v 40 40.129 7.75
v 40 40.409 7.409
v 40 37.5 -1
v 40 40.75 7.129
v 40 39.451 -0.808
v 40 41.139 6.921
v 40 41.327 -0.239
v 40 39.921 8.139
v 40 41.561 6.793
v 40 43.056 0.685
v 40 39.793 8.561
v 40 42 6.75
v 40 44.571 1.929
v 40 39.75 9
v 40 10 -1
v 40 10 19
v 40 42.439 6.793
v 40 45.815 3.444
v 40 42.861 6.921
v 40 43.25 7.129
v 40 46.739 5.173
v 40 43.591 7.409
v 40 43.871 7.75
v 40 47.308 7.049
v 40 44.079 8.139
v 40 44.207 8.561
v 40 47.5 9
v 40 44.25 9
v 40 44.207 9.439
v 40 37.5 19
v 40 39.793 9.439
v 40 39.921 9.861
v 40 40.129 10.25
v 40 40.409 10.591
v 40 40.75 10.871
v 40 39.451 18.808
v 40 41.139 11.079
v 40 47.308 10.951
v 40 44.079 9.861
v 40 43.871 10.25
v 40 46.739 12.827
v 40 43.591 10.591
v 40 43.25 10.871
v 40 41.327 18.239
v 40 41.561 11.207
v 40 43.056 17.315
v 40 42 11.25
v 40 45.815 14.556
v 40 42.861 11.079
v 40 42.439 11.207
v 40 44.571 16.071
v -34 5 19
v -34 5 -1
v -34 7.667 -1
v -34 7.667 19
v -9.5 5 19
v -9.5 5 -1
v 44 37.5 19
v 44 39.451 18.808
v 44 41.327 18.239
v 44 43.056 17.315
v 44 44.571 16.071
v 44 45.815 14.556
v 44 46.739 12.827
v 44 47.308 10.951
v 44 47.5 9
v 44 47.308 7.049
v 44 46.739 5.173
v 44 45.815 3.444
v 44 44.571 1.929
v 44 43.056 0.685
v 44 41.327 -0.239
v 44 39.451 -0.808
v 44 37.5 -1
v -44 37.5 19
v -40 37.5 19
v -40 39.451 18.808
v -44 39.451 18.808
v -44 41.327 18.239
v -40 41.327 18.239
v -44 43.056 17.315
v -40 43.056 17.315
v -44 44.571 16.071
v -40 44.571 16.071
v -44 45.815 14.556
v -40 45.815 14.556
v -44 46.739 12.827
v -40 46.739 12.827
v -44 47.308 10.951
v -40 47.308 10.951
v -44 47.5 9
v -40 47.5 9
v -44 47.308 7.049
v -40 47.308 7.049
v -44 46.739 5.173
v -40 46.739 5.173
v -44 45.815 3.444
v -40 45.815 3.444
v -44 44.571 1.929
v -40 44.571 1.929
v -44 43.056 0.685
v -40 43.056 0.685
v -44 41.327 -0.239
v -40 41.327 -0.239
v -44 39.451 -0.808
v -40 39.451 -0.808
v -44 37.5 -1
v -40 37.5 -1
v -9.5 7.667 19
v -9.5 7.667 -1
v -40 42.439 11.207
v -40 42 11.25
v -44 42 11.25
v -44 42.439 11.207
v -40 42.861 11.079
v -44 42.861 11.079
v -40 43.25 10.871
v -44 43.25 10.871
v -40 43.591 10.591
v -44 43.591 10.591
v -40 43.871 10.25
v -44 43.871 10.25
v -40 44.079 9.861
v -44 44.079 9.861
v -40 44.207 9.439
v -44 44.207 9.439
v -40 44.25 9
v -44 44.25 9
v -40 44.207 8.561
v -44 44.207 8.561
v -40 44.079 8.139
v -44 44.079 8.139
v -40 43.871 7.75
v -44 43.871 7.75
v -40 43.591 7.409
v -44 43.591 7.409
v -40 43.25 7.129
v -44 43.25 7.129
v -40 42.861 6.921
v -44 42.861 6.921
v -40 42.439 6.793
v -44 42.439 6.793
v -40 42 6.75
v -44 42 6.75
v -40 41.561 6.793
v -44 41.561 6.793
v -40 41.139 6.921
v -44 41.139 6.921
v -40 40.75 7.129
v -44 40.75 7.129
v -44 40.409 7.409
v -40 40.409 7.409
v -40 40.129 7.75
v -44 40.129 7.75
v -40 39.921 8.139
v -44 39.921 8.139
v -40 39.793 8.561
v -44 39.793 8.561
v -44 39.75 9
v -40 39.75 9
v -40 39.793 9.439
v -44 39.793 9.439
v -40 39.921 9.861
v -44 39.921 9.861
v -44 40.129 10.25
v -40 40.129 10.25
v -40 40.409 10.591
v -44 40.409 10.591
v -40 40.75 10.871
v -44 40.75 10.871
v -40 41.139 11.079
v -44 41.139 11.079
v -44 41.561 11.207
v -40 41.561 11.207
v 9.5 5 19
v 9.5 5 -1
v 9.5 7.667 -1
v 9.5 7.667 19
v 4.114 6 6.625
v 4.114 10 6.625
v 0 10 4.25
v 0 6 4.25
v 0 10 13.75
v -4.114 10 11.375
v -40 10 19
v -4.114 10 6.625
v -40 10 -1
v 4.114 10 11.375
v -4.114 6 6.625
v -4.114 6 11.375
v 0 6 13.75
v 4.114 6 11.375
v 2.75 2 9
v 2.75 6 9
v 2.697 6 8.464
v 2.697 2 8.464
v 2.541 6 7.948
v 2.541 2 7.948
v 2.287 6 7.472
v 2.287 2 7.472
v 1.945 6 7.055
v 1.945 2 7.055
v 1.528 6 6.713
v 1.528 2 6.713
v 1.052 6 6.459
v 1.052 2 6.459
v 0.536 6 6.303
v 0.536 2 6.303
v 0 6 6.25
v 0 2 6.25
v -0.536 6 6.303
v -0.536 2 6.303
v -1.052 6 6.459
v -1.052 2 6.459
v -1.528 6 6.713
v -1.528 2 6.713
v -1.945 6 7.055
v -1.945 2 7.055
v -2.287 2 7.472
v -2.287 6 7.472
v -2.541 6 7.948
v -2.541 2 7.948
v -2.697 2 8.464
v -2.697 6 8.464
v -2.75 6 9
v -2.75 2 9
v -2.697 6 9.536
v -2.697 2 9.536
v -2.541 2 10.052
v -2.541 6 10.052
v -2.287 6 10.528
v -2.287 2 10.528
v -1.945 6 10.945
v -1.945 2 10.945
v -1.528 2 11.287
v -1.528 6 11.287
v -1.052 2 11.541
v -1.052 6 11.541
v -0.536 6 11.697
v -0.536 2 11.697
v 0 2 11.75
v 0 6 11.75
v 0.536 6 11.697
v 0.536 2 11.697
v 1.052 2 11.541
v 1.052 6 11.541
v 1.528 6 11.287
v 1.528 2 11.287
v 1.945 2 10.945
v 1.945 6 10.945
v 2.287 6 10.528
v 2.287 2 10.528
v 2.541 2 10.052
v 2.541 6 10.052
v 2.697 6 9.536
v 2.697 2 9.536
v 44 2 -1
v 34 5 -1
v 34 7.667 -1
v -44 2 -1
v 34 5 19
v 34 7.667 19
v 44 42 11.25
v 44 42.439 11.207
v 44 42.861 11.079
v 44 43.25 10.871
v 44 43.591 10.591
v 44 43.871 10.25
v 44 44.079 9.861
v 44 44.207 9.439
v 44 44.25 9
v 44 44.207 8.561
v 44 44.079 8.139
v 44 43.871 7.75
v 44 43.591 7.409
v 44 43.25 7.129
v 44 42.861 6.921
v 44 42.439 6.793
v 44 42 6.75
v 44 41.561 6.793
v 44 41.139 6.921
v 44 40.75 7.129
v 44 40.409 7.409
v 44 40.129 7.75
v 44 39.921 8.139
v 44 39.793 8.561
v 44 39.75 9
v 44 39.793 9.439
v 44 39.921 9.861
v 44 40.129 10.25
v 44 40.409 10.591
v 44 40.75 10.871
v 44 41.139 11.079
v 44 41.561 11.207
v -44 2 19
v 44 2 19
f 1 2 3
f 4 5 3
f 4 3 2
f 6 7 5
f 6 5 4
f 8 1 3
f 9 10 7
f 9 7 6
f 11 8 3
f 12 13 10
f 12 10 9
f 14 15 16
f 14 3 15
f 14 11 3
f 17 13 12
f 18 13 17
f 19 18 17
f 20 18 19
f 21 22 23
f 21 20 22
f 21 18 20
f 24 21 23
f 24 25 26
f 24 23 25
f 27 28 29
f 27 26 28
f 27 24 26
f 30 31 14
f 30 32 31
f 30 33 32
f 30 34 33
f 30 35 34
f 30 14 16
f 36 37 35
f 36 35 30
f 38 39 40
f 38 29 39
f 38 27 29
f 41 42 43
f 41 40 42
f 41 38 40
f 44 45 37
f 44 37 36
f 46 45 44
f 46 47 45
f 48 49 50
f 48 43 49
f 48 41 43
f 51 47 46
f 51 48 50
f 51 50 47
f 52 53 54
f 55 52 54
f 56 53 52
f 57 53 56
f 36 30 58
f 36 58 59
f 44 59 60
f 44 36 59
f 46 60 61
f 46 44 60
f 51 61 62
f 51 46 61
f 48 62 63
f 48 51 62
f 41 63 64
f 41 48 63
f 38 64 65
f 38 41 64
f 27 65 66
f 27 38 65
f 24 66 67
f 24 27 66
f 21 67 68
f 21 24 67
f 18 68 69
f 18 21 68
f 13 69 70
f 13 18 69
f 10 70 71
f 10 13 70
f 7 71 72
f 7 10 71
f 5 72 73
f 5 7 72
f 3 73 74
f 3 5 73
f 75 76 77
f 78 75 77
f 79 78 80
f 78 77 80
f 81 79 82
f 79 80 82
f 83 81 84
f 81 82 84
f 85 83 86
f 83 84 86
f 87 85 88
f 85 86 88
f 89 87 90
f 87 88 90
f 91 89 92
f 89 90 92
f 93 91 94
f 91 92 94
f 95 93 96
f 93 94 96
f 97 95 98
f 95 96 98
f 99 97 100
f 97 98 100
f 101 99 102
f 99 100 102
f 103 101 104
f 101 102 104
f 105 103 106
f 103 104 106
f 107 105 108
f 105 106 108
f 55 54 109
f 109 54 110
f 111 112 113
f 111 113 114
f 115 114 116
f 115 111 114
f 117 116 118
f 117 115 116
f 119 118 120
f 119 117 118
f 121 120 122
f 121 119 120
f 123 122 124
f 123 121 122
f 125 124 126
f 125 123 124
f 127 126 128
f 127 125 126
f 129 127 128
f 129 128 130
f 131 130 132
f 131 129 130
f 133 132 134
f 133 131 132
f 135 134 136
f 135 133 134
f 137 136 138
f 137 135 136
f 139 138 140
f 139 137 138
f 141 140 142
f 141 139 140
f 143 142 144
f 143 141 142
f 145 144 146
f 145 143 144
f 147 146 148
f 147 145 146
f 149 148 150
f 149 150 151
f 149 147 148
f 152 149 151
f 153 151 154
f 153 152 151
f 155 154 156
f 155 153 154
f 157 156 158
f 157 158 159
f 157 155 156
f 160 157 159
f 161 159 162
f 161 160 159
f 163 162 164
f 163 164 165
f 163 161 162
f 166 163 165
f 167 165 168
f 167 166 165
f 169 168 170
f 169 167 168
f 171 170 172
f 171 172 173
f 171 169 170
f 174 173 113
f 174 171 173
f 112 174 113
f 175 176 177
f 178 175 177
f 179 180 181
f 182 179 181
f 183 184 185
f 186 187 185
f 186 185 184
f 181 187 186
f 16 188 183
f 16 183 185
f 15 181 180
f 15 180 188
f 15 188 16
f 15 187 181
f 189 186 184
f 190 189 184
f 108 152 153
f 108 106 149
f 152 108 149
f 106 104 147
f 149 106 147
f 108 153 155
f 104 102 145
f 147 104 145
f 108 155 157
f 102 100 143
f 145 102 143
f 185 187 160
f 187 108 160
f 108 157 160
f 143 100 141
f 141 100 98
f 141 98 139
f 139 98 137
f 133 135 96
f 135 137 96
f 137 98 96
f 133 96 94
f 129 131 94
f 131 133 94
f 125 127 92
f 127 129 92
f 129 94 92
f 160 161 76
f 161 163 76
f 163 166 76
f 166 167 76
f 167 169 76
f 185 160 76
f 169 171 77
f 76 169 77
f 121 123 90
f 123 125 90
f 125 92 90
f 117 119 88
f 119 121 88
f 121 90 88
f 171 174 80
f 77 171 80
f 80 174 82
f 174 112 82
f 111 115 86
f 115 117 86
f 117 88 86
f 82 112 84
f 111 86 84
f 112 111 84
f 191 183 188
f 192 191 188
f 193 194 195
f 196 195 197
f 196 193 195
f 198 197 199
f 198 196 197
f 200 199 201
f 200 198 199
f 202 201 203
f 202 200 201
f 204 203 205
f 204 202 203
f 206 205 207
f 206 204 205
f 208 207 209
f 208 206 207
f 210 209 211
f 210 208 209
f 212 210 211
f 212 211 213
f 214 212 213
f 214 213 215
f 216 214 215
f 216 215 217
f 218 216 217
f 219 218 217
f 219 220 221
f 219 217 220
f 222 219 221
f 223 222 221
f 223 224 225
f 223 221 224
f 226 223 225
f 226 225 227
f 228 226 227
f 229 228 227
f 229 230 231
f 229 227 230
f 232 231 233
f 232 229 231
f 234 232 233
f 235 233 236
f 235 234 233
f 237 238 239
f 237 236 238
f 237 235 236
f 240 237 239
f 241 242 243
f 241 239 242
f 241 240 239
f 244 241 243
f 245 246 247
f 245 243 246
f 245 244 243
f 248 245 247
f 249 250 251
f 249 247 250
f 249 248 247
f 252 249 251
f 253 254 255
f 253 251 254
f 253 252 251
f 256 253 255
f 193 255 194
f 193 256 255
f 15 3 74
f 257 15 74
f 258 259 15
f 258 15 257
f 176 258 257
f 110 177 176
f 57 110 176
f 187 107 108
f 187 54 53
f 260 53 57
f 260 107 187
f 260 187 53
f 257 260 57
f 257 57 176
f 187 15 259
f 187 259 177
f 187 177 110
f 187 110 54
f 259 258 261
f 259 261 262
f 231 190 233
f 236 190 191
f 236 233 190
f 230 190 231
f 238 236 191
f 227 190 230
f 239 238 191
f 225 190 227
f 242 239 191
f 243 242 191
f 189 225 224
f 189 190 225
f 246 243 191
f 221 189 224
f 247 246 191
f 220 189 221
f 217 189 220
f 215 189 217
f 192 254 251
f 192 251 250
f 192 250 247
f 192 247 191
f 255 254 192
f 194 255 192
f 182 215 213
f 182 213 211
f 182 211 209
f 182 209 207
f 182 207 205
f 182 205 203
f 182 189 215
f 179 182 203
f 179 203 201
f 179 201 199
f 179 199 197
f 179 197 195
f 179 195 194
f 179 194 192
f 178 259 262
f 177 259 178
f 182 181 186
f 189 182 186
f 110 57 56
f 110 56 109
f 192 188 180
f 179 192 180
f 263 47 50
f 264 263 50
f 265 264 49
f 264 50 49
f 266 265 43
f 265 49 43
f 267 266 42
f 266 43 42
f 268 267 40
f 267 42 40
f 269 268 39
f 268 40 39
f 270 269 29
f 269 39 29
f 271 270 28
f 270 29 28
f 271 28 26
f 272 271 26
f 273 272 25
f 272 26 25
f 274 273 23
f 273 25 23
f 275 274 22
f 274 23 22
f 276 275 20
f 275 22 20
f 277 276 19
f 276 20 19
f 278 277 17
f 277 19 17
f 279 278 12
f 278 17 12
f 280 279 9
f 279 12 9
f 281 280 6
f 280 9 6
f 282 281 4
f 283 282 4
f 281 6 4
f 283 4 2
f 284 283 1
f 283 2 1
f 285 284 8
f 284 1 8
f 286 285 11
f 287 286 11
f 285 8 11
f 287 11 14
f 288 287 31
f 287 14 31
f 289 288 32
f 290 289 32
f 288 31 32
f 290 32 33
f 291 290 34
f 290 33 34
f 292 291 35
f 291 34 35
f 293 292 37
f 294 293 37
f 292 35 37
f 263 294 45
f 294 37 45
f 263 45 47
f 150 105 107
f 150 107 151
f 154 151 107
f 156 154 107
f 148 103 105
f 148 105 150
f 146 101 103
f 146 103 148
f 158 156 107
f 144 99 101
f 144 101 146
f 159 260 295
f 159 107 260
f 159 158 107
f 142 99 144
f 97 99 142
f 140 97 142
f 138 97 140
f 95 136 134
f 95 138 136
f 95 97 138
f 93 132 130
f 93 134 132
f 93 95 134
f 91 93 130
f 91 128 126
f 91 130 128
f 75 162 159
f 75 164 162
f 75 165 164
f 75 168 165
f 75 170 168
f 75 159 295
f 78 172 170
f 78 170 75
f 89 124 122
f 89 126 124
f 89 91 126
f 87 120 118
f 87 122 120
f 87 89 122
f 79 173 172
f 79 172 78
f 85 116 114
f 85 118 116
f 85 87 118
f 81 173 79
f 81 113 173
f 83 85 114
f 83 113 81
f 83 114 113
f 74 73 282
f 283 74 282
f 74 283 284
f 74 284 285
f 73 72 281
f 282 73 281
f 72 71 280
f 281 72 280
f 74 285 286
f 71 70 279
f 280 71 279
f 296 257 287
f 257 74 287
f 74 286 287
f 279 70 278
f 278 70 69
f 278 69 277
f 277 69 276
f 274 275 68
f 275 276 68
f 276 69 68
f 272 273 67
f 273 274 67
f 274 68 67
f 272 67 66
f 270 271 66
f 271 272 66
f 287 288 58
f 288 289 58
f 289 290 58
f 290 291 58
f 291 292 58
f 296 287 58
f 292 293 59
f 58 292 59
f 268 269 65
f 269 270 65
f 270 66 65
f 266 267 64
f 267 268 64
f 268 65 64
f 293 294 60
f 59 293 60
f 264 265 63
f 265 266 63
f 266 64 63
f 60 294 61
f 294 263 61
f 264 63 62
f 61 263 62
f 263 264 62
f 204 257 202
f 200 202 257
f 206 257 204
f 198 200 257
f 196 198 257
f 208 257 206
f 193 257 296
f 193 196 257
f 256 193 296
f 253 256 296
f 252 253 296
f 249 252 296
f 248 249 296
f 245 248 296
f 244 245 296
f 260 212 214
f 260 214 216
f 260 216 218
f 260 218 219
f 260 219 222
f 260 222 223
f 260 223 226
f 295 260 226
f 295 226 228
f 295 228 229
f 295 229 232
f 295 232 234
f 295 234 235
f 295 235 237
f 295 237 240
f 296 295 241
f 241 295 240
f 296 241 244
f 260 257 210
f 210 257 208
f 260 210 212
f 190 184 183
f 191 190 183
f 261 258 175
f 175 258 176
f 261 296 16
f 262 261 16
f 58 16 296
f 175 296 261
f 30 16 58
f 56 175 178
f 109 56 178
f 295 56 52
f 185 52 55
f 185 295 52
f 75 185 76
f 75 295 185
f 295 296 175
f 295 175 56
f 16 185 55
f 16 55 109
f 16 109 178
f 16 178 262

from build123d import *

# Parameters (mm, degrees)
SKETCH005_W             = 80
SKETCH005_H             = 20
SKETCH005_R             = 2.75
PAD010_DEPTH            = 8
POCKET009_DEPTH         = 4
SKETCH011_W             = 24.5
SKETCH011_H             = 2.666667
POCKET010_DEPTH         = 185.699521
SKETCH017_R             = 2.25
PAD011_DEPTH            = 4
BODY002_PLACEMENT_ANGLE = 180


with BuildPart() as part:
    # Sketch005 → Pad010 (new body)
    with BuildSketch(Plane.XZ):
        Rectangle(SKETCH005_W, SKETCH005_H)
        Circle(SKETCH005_R, mode=Mode.SUBTRACT)
    extrude(amount=PAD010_DEPTH)

    # Sketch007 → Pocket009 (cut)
    with BuildSketch(Plane.XZ.offset(8)):
        Polygon((4.113621, 2.375), (0, 4.75), (-4.113621, 2.375), (-4.113621, -2.375), (0, -4.75), (4.113621, -2.375), align=None)
    extrude(amount=-POCKET009_DEPTH, mode=Mode.SUBTRACT)

    # Sketch011 → Pocket010 (cut, through all)
    with BuildSketch(Plane(origin=(0, 0, 10), x_dir=(-1, 0, 0), z_dir=(0, 0, 1))):
        with Locations((-21.75, 4.333334)):
            Rectangle(SKETCH011_W, SKETCH011_H)
    pocket010 = extrude(amount=-POCKET010_DEPTH, mode=Mode.SUBTRACT)

    # Sketch017 (on Face4 of Pad010) → Pad011 (join)
    with BuildSketch(Plane(origin=(-40, 0, 0), x_dir=(0, 0, -1), z_dir=(-1, 0, 0))):
        with BuildLine():
            Line((-10, 0), (10, 0))
            Line((10, 0), (10, 35.5))
            ThreePointArc((10, 35.5), (0, 45.5), (-10, 35.5))
            Line((-10, 35.5), (-10, 0))
        make_face()
        with Locations((0, 40)):
            Circle(SKETCH017_R, mode=Mode.SUBTRACT)
    pad011 = extrude(amount=PAD011_DEPTH)

    # Mirrored007: Pad011 across YZ
    add(pad011.mirror(Plane.YZ))

    # Mirrored008: Pocket010 across YZ
    add(pocket010.mirror(Plane.YZ), mode=Mode.SUBTRACT)


with BuildPart() as part_1:
    # Body002 placement: moved
    add(part.part.moved(Location((0, 2, 9))).rotate(Axis((0, 2, 9), (1, 0, 0)), BODY002_PLACEMENT_ANGLE))


solid = part_1.part
